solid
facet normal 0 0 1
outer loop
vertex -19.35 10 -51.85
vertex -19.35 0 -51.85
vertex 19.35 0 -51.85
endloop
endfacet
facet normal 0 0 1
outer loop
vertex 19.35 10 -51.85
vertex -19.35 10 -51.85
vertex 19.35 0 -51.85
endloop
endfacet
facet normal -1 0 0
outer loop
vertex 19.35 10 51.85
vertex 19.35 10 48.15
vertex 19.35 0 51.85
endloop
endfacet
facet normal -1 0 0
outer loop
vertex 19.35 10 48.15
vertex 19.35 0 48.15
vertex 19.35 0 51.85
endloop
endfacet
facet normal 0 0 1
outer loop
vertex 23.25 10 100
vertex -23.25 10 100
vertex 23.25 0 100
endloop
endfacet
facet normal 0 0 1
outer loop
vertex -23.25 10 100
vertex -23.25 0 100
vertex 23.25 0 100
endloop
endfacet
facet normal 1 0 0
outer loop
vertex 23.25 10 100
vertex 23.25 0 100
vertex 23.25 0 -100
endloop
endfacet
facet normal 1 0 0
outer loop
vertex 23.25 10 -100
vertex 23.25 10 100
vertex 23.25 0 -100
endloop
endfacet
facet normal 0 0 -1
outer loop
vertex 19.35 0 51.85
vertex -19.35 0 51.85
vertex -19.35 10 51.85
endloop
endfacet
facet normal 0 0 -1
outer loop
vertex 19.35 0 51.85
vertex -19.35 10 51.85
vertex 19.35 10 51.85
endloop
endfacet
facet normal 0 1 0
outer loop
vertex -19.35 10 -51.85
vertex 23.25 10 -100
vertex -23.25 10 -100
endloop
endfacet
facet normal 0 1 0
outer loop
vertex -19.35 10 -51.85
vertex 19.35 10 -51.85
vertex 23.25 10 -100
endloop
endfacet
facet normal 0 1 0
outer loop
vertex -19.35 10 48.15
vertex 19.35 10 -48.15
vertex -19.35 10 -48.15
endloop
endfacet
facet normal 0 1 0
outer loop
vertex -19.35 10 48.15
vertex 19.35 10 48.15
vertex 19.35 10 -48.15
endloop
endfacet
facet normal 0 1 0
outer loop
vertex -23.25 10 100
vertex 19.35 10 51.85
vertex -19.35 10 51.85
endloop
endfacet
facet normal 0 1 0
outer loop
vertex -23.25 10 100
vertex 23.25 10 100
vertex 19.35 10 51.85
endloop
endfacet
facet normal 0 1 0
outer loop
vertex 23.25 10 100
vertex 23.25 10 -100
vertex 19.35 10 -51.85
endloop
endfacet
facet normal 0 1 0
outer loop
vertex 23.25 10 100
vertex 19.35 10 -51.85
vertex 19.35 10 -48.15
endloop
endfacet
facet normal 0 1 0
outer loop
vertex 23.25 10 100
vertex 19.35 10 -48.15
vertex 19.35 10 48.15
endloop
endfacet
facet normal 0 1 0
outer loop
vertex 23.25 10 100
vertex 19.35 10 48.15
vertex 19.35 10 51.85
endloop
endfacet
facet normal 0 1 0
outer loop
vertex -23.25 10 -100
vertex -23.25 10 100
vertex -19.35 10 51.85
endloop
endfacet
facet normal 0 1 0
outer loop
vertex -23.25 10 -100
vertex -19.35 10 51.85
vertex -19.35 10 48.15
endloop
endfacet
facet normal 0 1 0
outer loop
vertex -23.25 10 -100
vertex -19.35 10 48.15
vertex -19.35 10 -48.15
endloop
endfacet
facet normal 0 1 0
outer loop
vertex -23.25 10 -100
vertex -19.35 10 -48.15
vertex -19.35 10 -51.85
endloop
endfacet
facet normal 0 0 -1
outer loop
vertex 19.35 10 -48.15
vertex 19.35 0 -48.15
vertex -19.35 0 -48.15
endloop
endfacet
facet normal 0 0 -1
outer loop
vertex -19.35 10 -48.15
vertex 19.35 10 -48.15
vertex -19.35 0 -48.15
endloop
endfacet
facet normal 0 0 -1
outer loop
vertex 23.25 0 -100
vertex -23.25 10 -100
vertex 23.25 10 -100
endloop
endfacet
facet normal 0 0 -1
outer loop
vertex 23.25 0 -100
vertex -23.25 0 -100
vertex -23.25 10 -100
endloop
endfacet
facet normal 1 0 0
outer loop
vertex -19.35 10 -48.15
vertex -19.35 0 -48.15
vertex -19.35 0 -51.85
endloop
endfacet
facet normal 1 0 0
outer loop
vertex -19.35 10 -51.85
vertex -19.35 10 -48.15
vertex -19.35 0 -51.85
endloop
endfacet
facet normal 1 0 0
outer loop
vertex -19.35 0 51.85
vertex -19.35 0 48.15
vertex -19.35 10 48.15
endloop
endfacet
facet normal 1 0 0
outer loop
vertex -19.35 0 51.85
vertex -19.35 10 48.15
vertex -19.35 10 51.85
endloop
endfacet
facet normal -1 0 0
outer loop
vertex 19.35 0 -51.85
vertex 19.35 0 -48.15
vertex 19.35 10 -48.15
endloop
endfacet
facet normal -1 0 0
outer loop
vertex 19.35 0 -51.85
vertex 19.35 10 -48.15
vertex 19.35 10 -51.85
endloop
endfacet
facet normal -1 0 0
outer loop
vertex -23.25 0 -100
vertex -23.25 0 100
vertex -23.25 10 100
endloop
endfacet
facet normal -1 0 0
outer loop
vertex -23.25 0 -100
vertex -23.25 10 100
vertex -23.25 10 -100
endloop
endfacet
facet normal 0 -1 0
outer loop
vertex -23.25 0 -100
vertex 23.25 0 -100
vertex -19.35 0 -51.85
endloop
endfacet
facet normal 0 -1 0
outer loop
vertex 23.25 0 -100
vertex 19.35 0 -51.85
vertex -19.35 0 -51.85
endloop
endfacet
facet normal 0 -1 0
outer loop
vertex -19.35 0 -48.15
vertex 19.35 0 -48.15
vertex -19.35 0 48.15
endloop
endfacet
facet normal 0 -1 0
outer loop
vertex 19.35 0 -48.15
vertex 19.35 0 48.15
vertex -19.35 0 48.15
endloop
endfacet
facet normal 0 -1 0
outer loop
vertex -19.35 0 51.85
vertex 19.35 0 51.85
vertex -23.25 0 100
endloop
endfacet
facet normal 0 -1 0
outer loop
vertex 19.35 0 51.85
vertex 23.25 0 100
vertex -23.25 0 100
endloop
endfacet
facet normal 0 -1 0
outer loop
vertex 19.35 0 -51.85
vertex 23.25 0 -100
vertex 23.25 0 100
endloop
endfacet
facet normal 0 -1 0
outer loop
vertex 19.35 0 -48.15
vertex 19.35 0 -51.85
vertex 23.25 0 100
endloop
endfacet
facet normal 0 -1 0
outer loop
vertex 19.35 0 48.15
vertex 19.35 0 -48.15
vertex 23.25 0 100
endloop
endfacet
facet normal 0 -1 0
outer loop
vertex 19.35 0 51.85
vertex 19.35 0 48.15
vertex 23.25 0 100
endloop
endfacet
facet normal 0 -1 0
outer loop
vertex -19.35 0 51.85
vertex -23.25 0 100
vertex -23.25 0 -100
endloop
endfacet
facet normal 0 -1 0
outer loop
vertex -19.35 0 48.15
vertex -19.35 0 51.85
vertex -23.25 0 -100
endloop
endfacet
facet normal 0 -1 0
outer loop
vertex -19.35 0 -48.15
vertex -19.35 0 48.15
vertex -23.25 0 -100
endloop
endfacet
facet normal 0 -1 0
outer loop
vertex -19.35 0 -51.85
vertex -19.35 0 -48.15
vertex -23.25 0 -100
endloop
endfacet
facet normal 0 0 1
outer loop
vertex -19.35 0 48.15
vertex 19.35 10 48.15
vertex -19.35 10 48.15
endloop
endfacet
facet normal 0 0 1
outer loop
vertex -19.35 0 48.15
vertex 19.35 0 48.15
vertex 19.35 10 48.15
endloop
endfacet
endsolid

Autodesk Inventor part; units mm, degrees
ref_plane "YZ Plane" through (0, 0, 0) normal (1, 0, 0) x (0, 1, 0)
ref_plane "XZ Plane" through (0, 0, 0) normal (0, 1, 0) x (-1, 0, 0)
ref_plane "XY Plane" through (0, 0, 0) normal (0, 0, 1) x (1, 0, 0)
sketch "스케치1" plane through (0, 0, 0) normal (0, 1, 0) x (-1, 0, 0)
  line L0 (23.25, 0) -> (23.25, -100)
  line L1 (23.25, -100) -> (0, -100)
  line L2 (32.55, 0) -> (-32.55, 0) projected
  line L3 (0, -144) -> (0, 164) projected
  line L4 (0, -48.15) -> (19.35, -48.15)
  line L5 (19.35, -48.15) -> (19.35, -51.85)
  line L6 (19.35, -51.85) -> (0, -51.85)
  line L7 (23.25, 0) -> (23.25, 100)
  line L8 (23.25, 100) -> (0, 100)
  line L9 (0, 144) -> (0, -164)
  line L10 (0, 48.15) -> (19.35, 48.15)
  line L11 (19.35, 48.15) -> (19.35, 51.85)
  line L12 (19.35, 51.85) -> (0, 51.85)
  line L13 (-23.25, 0) -> (-23.25, -100)
  line L14 (-23.25, -100) -> (0, -100)
  line L15 (-32.55, 0) -> (32.55, 0)
  line L16 (0, -48.15) -> (-19.35, -48.15)
  line L17 (-19.35, -48.15) -> (-19.35, -51.85)
  line L18 (-19.35, -51.85) -> (0, -51.85)
  line L19 (-23.25, 0) -> (-23.25, 100)
  line L20 (-23.25, 100) -> (0, 100)
  line L21 (0, 48.15) -> (-19.35, 48.15)
  line L22 (-19.35, 48.15) -> (-19.35, 51.85)
  line L23 (-19.35, 51.85) -> (0, 51.85)
  point P0 (0, 0)
  point P1 (11.625, -100)
  point P2 (11.625, 100)
  point P3 (-11.625, -100)
  point P4 (-11.625, 100)
  dimension "d0" = 100
  dimension "d1" = 23.25
  dimension "d2" = 3.7
  dimension "d3" = 19.35
  dimension "d4" = 48.15
extrude "돌출1" add sketch "스케치1" along normal blind 10 contours L0 L1 L3 L6 L5 L4 L2 | L2 L3 L10 L11 L12 L8 L7 | L3 L16 L17 L18 L14 L13 L2 | L2 L19 L20 L3 L23 L22 L21
properties part number "end_wall"
